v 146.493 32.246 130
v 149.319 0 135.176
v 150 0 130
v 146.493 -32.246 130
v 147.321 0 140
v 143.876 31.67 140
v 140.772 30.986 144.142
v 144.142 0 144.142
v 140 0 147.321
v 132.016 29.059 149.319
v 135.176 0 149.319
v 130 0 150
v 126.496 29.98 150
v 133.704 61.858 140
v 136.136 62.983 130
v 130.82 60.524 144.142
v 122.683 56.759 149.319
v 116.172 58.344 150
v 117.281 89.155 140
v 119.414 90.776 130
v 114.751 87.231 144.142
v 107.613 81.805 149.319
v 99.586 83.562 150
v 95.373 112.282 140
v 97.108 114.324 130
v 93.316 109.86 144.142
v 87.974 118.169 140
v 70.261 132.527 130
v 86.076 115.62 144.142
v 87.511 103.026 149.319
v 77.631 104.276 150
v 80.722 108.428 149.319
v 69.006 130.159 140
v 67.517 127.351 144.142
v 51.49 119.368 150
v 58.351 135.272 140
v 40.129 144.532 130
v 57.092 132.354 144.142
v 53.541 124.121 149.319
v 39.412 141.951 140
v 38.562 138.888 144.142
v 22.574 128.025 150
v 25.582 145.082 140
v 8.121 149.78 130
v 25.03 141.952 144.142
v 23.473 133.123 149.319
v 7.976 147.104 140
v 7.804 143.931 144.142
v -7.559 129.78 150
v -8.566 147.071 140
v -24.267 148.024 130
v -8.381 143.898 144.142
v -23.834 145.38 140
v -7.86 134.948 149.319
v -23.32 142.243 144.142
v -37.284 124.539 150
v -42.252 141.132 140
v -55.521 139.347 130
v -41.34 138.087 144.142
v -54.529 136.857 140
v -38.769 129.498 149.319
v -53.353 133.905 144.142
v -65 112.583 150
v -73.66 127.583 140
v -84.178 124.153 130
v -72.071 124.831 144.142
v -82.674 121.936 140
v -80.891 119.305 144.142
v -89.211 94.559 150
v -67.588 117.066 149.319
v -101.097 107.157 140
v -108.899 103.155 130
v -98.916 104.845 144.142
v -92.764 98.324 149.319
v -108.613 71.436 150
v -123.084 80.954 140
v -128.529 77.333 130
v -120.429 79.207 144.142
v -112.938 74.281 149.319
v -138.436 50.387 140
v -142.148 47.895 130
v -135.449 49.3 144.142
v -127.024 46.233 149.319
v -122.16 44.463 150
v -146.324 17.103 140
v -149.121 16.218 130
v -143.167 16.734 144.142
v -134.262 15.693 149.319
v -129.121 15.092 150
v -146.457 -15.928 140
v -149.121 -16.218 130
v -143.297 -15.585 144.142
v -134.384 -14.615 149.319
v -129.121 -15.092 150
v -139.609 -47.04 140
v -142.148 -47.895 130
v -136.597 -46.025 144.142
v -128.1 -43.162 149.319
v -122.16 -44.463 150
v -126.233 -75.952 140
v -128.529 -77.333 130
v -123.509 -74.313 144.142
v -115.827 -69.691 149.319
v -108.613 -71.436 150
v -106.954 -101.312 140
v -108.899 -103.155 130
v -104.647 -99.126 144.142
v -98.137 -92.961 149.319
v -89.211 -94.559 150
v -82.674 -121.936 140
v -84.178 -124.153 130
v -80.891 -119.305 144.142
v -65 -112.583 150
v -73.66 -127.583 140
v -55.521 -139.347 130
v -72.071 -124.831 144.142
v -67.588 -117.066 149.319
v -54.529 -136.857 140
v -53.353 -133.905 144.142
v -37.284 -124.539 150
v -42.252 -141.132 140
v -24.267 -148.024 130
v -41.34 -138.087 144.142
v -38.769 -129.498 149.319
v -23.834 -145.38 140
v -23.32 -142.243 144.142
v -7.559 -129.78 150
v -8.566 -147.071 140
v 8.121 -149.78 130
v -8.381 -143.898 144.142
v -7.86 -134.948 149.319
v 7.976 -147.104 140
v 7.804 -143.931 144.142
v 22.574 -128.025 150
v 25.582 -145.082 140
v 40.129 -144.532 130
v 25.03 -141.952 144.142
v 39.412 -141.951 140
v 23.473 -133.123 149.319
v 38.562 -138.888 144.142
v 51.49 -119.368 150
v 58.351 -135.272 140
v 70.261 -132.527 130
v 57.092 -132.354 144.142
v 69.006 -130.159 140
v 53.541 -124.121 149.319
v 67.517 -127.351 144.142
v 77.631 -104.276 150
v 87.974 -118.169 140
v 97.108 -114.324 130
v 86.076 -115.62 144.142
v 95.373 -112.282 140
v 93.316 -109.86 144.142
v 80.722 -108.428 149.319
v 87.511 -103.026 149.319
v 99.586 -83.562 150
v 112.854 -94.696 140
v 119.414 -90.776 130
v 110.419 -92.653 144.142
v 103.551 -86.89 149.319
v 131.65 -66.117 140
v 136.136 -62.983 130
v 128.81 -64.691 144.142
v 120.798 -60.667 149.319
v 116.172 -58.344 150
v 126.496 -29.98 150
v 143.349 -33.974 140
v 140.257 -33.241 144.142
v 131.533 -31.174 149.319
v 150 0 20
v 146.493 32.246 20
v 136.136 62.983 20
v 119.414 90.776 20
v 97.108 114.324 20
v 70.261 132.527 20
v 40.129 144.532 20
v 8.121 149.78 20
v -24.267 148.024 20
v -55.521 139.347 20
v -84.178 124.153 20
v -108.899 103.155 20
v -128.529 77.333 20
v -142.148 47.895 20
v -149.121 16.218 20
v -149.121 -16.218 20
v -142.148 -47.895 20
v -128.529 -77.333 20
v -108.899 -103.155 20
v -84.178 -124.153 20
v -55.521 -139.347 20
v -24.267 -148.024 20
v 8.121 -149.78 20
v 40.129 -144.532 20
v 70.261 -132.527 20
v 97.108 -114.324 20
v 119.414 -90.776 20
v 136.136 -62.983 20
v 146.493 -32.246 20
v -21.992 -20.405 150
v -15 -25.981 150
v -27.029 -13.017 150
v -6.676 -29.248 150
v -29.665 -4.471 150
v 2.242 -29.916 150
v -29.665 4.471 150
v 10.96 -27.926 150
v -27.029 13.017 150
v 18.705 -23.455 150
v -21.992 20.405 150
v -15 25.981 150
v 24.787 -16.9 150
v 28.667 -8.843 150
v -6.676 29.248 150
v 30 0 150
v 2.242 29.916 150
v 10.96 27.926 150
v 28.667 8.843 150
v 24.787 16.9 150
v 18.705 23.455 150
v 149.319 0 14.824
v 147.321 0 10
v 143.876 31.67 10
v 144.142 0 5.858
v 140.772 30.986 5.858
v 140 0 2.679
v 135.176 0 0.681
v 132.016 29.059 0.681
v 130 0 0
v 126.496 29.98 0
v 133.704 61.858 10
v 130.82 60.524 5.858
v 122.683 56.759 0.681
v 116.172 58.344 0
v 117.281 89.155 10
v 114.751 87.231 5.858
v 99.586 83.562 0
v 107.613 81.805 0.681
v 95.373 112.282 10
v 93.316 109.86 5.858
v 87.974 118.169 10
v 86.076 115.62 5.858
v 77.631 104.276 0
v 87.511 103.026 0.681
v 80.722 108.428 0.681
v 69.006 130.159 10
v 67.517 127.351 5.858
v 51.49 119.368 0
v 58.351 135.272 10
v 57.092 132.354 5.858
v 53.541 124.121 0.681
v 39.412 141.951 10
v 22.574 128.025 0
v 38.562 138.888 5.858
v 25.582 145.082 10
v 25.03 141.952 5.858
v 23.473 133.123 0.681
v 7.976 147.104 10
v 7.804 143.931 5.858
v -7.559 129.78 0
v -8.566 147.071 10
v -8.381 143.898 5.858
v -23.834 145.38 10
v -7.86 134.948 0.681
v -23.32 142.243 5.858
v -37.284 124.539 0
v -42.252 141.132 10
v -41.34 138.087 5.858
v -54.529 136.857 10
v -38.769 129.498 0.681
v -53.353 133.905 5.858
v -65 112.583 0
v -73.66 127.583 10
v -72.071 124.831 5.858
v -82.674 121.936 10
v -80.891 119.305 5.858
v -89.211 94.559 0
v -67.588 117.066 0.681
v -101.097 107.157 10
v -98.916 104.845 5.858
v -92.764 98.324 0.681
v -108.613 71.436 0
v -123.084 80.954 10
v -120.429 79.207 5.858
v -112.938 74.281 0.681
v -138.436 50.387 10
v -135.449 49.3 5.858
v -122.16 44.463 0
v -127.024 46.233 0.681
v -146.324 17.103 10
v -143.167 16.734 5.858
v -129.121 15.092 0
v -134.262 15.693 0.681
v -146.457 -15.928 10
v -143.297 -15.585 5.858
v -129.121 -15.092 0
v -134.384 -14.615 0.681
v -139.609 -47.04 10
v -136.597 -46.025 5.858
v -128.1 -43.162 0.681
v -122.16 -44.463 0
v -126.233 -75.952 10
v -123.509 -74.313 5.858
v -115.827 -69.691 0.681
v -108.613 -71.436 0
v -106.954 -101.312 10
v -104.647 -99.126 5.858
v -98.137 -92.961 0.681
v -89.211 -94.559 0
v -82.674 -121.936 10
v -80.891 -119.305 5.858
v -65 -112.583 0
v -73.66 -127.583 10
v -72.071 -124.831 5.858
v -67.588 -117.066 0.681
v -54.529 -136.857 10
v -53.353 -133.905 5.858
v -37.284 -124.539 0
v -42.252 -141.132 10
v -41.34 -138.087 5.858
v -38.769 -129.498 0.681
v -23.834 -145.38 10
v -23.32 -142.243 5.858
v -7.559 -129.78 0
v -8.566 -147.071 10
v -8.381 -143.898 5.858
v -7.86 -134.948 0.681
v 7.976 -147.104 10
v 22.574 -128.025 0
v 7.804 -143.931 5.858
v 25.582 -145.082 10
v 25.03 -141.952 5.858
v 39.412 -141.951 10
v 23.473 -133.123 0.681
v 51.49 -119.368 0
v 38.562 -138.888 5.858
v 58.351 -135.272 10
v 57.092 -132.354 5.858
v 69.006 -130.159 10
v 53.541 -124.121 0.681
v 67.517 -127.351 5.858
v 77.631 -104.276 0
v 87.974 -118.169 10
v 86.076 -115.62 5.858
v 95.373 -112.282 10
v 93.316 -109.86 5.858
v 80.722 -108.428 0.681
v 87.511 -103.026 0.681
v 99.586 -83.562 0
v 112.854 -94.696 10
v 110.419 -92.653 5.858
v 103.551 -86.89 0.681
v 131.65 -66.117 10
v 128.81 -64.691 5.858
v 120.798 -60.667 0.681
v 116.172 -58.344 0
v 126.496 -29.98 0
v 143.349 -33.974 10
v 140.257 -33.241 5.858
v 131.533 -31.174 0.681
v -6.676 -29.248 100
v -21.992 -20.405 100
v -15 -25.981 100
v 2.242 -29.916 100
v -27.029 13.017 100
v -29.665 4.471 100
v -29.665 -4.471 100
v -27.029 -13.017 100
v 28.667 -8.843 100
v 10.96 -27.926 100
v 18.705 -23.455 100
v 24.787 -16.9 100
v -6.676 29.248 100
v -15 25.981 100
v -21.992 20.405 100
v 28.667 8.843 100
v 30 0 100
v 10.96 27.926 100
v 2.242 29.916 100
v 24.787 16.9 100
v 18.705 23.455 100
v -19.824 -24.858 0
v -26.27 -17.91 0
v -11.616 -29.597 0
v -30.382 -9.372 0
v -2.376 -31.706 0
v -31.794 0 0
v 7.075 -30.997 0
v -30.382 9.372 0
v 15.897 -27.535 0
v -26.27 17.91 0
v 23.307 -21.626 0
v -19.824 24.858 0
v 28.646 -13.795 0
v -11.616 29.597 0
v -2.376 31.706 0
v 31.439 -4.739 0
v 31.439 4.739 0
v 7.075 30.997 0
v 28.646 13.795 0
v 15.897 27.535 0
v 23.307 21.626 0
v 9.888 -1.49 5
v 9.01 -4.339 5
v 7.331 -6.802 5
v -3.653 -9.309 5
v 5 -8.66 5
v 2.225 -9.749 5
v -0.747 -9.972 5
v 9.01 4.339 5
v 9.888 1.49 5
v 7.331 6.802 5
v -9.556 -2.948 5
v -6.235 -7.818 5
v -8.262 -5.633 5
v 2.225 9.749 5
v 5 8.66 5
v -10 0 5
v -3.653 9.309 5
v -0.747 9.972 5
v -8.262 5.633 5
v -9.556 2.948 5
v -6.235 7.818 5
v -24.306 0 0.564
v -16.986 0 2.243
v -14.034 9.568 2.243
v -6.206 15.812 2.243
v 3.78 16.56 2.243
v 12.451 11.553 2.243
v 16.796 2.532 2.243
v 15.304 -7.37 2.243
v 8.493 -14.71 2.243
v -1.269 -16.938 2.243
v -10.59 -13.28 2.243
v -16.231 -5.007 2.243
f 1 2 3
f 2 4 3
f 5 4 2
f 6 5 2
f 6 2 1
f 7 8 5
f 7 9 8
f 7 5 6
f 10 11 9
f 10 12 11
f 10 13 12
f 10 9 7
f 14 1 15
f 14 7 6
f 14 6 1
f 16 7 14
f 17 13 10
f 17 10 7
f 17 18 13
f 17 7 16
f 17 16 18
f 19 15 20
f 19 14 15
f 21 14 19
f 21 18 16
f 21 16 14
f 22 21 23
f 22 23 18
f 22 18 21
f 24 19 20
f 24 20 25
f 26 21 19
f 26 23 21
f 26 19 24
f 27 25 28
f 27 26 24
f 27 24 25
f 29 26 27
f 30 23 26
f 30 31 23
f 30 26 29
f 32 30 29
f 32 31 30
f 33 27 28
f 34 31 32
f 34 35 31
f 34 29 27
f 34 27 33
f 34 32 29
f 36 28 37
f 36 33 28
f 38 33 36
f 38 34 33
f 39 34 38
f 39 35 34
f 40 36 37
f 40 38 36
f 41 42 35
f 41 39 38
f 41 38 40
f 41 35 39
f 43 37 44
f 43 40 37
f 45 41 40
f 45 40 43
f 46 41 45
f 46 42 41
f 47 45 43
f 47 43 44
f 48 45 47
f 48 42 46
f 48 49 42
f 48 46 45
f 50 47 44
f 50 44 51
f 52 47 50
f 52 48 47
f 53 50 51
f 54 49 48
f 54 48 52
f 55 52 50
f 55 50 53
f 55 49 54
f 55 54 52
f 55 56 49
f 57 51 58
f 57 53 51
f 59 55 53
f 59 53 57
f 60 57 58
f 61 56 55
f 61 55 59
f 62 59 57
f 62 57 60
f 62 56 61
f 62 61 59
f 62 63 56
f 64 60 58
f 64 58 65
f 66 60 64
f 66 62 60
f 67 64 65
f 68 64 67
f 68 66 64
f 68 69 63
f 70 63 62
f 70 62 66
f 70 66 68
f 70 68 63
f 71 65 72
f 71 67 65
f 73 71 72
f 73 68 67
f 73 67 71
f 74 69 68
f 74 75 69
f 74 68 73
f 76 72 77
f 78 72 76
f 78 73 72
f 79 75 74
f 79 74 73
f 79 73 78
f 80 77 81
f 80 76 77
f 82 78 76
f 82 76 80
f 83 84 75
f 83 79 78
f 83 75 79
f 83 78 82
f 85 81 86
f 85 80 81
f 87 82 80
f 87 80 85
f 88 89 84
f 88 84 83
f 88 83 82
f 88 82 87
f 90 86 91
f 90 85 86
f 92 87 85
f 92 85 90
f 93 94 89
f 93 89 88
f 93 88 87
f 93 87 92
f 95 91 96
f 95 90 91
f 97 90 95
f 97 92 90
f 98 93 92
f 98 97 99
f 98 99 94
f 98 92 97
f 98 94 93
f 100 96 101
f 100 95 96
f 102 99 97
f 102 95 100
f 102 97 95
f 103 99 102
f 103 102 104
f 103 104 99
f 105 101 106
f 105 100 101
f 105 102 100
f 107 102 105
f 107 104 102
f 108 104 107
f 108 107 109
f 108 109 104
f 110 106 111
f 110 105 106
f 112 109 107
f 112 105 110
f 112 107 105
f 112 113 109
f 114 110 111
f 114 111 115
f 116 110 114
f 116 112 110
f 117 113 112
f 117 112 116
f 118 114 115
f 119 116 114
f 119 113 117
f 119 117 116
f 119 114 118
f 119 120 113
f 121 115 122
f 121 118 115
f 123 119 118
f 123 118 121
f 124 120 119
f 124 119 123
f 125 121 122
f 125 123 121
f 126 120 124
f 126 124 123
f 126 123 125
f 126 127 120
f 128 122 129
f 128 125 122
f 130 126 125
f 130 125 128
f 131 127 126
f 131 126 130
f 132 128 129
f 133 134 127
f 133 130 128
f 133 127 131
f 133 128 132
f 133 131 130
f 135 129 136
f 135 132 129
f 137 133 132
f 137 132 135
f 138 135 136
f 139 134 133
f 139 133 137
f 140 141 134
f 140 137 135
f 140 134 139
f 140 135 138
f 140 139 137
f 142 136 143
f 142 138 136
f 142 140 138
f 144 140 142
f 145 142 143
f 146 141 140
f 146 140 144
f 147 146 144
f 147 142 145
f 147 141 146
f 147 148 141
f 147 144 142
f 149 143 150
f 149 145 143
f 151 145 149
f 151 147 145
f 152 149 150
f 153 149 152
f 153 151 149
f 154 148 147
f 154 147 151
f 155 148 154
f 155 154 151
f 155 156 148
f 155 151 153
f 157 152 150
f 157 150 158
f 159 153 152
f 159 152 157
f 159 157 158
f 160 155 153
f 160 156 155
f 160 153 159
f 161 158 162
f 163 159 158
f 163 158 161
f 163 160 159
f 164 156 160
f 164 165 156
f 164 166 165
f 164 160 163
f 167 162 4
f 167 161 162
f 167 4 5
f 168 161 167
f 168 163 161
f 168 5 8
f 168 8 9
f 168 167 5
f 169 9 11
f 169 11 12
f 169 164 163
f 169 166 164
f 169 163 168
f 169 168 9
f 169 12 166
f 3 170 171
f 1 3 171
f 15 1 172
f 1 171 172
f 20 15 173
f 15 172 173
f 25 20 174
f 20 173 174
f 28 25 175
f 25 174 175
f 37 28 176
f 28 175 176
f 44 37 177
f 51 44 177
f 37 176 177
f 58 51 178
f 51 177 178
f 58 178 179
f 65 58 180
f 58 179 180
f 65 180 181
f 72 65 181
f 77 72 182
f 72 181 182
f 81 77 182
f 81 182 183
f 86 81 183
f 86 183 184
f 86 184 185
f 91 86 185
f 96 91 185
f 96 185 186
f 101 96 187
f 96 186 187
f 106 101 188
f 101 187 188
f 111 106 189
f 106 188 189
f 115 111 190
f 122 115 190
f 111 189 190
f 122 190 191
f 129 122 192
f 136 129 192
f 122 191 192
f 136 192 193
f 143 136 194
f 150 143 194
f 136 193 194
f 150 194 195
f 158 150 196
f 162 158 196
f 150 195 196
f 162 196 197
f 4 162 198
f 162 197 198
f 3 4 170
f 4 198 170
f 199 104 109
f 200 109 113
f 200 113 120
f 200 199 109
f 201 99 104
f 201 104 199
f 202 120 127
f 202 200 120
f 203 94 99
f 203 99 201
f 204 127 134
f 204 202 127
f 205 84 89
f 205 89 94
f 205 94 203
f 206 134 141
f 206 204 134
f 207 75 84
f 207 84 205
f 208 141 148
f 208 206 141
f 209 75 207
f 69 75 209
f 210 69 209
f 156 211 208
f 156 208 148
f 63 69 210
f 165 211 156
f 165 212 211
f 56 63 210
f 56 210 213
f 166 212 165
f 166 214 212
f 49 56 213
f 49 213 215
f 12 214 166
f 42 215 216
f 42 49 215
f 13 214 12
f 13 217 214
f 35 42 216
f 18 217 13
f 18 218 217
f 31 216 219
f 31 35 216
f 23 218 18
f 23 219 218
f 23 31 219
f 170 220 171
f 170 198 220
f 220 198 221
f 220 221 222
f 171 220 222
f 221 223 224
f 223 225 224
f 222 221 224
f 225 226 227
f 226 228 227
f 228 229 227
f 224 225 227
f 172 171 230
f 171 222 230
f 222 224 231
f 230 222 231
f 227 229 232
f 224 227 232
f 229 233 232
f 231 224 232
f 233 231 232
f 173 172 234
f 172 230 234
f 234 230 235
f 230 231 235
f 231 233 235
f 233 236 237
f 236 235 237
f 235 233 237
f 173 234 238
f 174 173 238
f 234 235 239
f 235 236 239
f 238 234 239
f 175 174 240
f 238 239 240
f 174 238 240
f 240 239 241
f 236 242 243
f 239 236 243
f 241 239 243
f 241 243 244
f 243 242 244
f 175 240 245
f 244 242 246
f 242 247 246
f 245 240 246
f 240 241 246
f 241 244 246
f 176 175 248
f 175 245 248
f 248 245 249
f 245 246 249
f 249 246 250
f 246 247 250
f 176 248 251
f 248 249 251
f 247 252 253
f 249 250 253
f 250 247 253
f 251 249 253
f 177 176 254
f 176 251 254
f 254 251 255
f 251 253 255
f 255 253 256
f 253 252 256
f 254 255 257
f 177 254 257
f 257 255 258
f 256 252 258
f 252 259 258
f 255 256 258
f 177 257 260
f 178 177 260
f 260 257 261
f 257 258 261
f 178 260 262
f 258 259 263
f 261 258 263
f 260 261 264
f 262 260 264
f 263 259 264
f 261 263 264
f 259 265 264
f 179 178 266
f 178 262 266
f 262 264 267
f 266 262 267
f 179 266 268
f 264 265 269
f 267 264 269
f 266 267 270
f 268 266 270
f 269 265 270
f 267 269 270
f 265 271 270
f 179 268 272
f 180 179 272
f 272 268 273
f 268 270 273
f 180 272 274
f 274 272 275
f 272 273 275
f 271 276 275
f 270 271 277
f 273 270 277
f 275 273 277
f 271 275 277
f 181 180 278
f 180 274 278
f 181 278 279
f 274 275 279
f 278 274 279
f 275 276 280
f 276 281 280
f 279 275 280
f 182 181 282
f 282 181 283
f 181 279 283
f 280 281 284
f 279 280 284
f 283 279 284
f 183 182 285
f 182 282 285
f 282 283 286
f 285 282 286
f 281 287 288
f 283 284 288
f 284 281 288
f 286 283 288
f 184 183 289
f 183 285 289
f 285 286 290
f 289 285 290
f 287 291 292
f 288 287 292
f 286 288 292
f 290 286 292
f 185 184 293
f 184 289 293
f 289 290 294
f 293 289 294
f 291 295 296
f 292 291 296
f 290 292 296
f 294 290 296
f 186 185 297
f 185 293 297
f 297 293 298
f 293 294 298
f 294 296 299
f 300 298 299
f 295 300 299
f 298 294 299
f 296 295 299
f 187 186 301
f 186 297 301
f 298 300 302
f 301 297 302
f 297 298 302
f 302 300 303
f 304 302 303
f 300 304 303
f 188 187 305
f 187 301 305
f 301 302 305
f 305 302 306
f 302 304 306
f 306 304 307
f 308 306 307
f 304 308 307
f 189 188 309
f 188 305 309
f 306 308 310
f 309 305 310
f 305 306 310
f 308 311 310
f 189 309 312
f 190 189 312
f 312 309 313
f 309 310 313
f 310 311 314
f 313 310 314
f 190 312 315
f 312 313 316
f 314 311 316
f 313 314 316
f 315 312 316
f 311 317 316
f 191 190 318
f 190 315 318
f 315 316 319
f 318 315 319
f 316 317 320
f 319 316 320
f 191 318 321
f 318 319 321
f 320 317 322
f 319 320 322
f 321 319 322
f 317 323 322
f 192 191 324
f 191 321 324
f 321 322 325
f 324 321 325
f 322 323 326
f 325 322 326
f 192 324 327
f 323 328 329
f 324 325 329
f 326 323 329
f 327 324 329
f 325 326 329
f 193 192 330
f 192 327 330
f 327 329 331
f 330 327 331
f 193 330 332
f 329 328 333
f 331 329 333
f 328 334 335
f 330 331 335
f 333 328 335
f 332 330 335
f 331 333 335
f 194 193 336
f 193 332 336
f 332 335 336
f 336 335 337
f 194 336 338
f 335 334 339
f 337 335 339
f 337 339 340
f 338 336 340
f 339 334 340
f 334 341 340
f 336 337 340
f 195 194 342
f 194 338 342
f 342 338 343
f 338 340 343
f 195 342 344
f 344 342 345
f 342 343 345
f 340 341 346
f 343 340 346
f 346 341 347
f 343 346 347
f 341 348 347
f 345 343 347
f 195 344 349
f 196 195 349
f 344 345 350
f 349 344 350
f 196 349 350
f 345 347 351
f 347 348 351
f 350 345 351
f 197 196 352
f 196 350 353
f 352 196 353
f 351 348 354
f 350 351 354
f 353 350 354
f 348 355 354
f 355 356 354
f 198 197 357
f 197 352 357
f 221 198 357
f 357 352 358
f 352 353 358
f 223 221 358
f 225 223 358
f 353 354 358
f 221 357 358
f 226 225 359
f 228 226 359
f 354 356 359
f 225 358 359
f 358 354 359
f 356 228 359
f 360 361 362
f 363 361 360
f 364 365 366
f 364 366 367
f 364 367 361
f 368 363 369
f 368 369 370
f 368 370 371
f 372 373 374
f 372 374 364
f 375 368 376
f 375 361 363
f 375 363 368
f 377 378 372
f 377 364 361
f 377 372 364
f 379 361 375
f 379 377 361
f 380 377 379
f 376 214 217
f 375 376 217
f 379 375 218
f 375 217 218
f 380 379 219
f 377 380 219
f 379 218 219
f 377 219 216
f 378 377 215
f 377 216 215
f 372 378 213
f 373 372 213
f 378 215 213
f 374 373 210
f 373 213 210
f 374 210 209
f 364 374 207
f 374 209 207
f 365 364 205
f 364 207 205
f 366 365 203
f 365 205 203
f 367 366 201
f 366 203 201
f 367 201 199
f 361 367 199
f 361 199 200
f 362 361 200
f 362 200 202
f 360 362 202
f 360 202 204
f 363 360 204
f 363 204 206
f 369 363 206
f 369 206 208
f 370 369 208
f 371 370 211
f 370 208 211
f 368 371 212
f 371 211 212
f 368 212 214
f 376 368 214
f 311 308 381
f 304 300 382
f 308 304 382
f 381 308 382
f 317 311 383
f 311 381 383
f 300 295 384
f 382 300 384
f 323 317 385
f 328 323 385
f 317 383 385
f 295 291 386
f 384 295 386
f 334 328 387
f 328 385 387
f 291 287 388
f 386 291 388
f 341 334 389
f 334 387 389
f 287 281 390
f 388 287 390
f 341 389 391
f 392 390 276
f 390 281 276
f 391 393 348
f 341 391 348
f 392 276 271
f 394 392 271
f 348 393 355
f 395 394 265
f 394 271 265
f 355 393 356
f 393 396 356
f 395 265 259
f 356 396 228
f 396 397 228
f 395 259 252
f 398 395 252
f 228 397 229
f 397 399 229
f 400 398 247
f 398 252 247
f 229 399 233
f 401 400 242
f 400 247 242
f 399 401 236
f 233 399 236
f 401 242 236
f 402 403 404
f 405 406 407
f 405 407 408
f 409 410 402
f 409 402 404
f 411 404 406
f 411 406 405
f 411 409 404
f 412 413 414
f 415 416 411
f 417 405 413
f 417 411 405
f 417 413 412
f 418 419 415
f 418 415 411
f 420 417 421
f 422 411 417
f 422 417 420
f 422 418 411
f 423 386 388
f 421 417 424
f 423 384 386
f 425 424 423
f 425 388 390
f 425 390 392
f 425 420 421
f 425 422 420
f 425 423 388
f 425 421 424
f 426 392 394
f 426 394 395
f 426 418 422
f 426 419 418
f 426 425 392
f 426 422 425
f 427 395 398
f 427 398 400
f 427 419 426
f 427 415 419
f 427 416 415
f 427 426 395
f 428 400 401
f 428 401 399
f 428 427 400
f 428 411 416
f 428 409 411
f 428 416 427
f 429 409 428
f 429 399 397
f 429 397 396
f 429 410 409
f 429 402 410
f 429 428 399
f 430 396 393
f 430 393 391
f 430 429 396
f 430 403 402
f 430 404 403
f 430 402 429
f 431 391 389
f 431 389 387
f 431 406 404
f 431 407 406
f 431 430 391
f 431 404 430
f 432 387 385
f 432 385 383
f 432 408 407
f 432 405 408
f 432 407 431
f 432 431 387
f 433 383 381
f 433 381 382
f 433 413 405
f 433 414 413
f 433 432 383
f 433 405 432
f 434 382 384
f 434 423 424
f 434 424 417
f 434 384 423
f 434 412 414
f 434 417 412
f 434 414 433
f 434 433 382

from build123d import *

# Parameters (mm, degrees)
SKETCH1_R           = 150
BOSS_EXTRUDE1_DEPTH = 150
SKETCH2_R           = 30
CUT_EXTRUDE1_DEPTH  = 50
FILLET1_R           = 20
SKETCH3_R           = 10
CUT_EXTRUDE2_DEPTH  = 5
FILLET4_R           = 50


with BuildPart() as part:
    # Sketch1 → Boss-Extrude1 (new body)
    with BuildSketch(Plane.XY):
        Circle(SKETCH1_R)
    extrude(amount=BOSS_EXTRUDE1_DEPTH)

    # Sketch2 → Cut-Extrude1 (cut)
    with BuildSketch(Plane.XY.offset(150)):
        Circle(SKETCH2_R)
    extrude(amount=-CUT_EXTRUDE1_DEPTH, mode=Mode.SUBTRACT)

    # Fillet1
    fillet1_edges = [part.edges().sort_by_distance(p)[0] for p in [
        (-150, 0, 0),
        (-150, 0, 150),
    ]]
    fillet(fillet1_edges, radius=FILLET1_R)

    # Sketch3 → Cut-Extrude2 (cut)
    with BuildSketch(Plane(origin=(0, 0, 0), x_dir=(-1, 0, 0), z_dir=(0, 0, -1))):
        Circle(SKETCH3_R)
    extrude(amount=-CUT_EXTRUDE2_DEPTH, mode=Mode.SUBTRACT)

    # Fillet4
    # the kernel refuses this fillet: 50 mm, written as the material it takes off along each edge
    with BuildSketch(Plane(origin=(0, 0, 0), x_dir=(-1, 0, 0), z_dir=(0, -1, 0))) as fillet4_piece_1:
        with BuildLine():
            CenterArc((31.794494718, -50), FILLET4_R, 90, 25.841932763)
            Line((10, -5), (9.564110106, -4.1))
            ThreePointArc((9.564110106, -4.1), (9, -2.5), (9, 0))
            Line((9, 0), (10, 1))
            Line((10, 1), (31.794494718, 1))
            Line((31.794494718, 1), (31.794494718, 0))
        make_face()
    revolve(axis=Axis((0, 0, 0), (0, 0, -1)), mode=Mode.SUBTRACT)


solid = part.part
